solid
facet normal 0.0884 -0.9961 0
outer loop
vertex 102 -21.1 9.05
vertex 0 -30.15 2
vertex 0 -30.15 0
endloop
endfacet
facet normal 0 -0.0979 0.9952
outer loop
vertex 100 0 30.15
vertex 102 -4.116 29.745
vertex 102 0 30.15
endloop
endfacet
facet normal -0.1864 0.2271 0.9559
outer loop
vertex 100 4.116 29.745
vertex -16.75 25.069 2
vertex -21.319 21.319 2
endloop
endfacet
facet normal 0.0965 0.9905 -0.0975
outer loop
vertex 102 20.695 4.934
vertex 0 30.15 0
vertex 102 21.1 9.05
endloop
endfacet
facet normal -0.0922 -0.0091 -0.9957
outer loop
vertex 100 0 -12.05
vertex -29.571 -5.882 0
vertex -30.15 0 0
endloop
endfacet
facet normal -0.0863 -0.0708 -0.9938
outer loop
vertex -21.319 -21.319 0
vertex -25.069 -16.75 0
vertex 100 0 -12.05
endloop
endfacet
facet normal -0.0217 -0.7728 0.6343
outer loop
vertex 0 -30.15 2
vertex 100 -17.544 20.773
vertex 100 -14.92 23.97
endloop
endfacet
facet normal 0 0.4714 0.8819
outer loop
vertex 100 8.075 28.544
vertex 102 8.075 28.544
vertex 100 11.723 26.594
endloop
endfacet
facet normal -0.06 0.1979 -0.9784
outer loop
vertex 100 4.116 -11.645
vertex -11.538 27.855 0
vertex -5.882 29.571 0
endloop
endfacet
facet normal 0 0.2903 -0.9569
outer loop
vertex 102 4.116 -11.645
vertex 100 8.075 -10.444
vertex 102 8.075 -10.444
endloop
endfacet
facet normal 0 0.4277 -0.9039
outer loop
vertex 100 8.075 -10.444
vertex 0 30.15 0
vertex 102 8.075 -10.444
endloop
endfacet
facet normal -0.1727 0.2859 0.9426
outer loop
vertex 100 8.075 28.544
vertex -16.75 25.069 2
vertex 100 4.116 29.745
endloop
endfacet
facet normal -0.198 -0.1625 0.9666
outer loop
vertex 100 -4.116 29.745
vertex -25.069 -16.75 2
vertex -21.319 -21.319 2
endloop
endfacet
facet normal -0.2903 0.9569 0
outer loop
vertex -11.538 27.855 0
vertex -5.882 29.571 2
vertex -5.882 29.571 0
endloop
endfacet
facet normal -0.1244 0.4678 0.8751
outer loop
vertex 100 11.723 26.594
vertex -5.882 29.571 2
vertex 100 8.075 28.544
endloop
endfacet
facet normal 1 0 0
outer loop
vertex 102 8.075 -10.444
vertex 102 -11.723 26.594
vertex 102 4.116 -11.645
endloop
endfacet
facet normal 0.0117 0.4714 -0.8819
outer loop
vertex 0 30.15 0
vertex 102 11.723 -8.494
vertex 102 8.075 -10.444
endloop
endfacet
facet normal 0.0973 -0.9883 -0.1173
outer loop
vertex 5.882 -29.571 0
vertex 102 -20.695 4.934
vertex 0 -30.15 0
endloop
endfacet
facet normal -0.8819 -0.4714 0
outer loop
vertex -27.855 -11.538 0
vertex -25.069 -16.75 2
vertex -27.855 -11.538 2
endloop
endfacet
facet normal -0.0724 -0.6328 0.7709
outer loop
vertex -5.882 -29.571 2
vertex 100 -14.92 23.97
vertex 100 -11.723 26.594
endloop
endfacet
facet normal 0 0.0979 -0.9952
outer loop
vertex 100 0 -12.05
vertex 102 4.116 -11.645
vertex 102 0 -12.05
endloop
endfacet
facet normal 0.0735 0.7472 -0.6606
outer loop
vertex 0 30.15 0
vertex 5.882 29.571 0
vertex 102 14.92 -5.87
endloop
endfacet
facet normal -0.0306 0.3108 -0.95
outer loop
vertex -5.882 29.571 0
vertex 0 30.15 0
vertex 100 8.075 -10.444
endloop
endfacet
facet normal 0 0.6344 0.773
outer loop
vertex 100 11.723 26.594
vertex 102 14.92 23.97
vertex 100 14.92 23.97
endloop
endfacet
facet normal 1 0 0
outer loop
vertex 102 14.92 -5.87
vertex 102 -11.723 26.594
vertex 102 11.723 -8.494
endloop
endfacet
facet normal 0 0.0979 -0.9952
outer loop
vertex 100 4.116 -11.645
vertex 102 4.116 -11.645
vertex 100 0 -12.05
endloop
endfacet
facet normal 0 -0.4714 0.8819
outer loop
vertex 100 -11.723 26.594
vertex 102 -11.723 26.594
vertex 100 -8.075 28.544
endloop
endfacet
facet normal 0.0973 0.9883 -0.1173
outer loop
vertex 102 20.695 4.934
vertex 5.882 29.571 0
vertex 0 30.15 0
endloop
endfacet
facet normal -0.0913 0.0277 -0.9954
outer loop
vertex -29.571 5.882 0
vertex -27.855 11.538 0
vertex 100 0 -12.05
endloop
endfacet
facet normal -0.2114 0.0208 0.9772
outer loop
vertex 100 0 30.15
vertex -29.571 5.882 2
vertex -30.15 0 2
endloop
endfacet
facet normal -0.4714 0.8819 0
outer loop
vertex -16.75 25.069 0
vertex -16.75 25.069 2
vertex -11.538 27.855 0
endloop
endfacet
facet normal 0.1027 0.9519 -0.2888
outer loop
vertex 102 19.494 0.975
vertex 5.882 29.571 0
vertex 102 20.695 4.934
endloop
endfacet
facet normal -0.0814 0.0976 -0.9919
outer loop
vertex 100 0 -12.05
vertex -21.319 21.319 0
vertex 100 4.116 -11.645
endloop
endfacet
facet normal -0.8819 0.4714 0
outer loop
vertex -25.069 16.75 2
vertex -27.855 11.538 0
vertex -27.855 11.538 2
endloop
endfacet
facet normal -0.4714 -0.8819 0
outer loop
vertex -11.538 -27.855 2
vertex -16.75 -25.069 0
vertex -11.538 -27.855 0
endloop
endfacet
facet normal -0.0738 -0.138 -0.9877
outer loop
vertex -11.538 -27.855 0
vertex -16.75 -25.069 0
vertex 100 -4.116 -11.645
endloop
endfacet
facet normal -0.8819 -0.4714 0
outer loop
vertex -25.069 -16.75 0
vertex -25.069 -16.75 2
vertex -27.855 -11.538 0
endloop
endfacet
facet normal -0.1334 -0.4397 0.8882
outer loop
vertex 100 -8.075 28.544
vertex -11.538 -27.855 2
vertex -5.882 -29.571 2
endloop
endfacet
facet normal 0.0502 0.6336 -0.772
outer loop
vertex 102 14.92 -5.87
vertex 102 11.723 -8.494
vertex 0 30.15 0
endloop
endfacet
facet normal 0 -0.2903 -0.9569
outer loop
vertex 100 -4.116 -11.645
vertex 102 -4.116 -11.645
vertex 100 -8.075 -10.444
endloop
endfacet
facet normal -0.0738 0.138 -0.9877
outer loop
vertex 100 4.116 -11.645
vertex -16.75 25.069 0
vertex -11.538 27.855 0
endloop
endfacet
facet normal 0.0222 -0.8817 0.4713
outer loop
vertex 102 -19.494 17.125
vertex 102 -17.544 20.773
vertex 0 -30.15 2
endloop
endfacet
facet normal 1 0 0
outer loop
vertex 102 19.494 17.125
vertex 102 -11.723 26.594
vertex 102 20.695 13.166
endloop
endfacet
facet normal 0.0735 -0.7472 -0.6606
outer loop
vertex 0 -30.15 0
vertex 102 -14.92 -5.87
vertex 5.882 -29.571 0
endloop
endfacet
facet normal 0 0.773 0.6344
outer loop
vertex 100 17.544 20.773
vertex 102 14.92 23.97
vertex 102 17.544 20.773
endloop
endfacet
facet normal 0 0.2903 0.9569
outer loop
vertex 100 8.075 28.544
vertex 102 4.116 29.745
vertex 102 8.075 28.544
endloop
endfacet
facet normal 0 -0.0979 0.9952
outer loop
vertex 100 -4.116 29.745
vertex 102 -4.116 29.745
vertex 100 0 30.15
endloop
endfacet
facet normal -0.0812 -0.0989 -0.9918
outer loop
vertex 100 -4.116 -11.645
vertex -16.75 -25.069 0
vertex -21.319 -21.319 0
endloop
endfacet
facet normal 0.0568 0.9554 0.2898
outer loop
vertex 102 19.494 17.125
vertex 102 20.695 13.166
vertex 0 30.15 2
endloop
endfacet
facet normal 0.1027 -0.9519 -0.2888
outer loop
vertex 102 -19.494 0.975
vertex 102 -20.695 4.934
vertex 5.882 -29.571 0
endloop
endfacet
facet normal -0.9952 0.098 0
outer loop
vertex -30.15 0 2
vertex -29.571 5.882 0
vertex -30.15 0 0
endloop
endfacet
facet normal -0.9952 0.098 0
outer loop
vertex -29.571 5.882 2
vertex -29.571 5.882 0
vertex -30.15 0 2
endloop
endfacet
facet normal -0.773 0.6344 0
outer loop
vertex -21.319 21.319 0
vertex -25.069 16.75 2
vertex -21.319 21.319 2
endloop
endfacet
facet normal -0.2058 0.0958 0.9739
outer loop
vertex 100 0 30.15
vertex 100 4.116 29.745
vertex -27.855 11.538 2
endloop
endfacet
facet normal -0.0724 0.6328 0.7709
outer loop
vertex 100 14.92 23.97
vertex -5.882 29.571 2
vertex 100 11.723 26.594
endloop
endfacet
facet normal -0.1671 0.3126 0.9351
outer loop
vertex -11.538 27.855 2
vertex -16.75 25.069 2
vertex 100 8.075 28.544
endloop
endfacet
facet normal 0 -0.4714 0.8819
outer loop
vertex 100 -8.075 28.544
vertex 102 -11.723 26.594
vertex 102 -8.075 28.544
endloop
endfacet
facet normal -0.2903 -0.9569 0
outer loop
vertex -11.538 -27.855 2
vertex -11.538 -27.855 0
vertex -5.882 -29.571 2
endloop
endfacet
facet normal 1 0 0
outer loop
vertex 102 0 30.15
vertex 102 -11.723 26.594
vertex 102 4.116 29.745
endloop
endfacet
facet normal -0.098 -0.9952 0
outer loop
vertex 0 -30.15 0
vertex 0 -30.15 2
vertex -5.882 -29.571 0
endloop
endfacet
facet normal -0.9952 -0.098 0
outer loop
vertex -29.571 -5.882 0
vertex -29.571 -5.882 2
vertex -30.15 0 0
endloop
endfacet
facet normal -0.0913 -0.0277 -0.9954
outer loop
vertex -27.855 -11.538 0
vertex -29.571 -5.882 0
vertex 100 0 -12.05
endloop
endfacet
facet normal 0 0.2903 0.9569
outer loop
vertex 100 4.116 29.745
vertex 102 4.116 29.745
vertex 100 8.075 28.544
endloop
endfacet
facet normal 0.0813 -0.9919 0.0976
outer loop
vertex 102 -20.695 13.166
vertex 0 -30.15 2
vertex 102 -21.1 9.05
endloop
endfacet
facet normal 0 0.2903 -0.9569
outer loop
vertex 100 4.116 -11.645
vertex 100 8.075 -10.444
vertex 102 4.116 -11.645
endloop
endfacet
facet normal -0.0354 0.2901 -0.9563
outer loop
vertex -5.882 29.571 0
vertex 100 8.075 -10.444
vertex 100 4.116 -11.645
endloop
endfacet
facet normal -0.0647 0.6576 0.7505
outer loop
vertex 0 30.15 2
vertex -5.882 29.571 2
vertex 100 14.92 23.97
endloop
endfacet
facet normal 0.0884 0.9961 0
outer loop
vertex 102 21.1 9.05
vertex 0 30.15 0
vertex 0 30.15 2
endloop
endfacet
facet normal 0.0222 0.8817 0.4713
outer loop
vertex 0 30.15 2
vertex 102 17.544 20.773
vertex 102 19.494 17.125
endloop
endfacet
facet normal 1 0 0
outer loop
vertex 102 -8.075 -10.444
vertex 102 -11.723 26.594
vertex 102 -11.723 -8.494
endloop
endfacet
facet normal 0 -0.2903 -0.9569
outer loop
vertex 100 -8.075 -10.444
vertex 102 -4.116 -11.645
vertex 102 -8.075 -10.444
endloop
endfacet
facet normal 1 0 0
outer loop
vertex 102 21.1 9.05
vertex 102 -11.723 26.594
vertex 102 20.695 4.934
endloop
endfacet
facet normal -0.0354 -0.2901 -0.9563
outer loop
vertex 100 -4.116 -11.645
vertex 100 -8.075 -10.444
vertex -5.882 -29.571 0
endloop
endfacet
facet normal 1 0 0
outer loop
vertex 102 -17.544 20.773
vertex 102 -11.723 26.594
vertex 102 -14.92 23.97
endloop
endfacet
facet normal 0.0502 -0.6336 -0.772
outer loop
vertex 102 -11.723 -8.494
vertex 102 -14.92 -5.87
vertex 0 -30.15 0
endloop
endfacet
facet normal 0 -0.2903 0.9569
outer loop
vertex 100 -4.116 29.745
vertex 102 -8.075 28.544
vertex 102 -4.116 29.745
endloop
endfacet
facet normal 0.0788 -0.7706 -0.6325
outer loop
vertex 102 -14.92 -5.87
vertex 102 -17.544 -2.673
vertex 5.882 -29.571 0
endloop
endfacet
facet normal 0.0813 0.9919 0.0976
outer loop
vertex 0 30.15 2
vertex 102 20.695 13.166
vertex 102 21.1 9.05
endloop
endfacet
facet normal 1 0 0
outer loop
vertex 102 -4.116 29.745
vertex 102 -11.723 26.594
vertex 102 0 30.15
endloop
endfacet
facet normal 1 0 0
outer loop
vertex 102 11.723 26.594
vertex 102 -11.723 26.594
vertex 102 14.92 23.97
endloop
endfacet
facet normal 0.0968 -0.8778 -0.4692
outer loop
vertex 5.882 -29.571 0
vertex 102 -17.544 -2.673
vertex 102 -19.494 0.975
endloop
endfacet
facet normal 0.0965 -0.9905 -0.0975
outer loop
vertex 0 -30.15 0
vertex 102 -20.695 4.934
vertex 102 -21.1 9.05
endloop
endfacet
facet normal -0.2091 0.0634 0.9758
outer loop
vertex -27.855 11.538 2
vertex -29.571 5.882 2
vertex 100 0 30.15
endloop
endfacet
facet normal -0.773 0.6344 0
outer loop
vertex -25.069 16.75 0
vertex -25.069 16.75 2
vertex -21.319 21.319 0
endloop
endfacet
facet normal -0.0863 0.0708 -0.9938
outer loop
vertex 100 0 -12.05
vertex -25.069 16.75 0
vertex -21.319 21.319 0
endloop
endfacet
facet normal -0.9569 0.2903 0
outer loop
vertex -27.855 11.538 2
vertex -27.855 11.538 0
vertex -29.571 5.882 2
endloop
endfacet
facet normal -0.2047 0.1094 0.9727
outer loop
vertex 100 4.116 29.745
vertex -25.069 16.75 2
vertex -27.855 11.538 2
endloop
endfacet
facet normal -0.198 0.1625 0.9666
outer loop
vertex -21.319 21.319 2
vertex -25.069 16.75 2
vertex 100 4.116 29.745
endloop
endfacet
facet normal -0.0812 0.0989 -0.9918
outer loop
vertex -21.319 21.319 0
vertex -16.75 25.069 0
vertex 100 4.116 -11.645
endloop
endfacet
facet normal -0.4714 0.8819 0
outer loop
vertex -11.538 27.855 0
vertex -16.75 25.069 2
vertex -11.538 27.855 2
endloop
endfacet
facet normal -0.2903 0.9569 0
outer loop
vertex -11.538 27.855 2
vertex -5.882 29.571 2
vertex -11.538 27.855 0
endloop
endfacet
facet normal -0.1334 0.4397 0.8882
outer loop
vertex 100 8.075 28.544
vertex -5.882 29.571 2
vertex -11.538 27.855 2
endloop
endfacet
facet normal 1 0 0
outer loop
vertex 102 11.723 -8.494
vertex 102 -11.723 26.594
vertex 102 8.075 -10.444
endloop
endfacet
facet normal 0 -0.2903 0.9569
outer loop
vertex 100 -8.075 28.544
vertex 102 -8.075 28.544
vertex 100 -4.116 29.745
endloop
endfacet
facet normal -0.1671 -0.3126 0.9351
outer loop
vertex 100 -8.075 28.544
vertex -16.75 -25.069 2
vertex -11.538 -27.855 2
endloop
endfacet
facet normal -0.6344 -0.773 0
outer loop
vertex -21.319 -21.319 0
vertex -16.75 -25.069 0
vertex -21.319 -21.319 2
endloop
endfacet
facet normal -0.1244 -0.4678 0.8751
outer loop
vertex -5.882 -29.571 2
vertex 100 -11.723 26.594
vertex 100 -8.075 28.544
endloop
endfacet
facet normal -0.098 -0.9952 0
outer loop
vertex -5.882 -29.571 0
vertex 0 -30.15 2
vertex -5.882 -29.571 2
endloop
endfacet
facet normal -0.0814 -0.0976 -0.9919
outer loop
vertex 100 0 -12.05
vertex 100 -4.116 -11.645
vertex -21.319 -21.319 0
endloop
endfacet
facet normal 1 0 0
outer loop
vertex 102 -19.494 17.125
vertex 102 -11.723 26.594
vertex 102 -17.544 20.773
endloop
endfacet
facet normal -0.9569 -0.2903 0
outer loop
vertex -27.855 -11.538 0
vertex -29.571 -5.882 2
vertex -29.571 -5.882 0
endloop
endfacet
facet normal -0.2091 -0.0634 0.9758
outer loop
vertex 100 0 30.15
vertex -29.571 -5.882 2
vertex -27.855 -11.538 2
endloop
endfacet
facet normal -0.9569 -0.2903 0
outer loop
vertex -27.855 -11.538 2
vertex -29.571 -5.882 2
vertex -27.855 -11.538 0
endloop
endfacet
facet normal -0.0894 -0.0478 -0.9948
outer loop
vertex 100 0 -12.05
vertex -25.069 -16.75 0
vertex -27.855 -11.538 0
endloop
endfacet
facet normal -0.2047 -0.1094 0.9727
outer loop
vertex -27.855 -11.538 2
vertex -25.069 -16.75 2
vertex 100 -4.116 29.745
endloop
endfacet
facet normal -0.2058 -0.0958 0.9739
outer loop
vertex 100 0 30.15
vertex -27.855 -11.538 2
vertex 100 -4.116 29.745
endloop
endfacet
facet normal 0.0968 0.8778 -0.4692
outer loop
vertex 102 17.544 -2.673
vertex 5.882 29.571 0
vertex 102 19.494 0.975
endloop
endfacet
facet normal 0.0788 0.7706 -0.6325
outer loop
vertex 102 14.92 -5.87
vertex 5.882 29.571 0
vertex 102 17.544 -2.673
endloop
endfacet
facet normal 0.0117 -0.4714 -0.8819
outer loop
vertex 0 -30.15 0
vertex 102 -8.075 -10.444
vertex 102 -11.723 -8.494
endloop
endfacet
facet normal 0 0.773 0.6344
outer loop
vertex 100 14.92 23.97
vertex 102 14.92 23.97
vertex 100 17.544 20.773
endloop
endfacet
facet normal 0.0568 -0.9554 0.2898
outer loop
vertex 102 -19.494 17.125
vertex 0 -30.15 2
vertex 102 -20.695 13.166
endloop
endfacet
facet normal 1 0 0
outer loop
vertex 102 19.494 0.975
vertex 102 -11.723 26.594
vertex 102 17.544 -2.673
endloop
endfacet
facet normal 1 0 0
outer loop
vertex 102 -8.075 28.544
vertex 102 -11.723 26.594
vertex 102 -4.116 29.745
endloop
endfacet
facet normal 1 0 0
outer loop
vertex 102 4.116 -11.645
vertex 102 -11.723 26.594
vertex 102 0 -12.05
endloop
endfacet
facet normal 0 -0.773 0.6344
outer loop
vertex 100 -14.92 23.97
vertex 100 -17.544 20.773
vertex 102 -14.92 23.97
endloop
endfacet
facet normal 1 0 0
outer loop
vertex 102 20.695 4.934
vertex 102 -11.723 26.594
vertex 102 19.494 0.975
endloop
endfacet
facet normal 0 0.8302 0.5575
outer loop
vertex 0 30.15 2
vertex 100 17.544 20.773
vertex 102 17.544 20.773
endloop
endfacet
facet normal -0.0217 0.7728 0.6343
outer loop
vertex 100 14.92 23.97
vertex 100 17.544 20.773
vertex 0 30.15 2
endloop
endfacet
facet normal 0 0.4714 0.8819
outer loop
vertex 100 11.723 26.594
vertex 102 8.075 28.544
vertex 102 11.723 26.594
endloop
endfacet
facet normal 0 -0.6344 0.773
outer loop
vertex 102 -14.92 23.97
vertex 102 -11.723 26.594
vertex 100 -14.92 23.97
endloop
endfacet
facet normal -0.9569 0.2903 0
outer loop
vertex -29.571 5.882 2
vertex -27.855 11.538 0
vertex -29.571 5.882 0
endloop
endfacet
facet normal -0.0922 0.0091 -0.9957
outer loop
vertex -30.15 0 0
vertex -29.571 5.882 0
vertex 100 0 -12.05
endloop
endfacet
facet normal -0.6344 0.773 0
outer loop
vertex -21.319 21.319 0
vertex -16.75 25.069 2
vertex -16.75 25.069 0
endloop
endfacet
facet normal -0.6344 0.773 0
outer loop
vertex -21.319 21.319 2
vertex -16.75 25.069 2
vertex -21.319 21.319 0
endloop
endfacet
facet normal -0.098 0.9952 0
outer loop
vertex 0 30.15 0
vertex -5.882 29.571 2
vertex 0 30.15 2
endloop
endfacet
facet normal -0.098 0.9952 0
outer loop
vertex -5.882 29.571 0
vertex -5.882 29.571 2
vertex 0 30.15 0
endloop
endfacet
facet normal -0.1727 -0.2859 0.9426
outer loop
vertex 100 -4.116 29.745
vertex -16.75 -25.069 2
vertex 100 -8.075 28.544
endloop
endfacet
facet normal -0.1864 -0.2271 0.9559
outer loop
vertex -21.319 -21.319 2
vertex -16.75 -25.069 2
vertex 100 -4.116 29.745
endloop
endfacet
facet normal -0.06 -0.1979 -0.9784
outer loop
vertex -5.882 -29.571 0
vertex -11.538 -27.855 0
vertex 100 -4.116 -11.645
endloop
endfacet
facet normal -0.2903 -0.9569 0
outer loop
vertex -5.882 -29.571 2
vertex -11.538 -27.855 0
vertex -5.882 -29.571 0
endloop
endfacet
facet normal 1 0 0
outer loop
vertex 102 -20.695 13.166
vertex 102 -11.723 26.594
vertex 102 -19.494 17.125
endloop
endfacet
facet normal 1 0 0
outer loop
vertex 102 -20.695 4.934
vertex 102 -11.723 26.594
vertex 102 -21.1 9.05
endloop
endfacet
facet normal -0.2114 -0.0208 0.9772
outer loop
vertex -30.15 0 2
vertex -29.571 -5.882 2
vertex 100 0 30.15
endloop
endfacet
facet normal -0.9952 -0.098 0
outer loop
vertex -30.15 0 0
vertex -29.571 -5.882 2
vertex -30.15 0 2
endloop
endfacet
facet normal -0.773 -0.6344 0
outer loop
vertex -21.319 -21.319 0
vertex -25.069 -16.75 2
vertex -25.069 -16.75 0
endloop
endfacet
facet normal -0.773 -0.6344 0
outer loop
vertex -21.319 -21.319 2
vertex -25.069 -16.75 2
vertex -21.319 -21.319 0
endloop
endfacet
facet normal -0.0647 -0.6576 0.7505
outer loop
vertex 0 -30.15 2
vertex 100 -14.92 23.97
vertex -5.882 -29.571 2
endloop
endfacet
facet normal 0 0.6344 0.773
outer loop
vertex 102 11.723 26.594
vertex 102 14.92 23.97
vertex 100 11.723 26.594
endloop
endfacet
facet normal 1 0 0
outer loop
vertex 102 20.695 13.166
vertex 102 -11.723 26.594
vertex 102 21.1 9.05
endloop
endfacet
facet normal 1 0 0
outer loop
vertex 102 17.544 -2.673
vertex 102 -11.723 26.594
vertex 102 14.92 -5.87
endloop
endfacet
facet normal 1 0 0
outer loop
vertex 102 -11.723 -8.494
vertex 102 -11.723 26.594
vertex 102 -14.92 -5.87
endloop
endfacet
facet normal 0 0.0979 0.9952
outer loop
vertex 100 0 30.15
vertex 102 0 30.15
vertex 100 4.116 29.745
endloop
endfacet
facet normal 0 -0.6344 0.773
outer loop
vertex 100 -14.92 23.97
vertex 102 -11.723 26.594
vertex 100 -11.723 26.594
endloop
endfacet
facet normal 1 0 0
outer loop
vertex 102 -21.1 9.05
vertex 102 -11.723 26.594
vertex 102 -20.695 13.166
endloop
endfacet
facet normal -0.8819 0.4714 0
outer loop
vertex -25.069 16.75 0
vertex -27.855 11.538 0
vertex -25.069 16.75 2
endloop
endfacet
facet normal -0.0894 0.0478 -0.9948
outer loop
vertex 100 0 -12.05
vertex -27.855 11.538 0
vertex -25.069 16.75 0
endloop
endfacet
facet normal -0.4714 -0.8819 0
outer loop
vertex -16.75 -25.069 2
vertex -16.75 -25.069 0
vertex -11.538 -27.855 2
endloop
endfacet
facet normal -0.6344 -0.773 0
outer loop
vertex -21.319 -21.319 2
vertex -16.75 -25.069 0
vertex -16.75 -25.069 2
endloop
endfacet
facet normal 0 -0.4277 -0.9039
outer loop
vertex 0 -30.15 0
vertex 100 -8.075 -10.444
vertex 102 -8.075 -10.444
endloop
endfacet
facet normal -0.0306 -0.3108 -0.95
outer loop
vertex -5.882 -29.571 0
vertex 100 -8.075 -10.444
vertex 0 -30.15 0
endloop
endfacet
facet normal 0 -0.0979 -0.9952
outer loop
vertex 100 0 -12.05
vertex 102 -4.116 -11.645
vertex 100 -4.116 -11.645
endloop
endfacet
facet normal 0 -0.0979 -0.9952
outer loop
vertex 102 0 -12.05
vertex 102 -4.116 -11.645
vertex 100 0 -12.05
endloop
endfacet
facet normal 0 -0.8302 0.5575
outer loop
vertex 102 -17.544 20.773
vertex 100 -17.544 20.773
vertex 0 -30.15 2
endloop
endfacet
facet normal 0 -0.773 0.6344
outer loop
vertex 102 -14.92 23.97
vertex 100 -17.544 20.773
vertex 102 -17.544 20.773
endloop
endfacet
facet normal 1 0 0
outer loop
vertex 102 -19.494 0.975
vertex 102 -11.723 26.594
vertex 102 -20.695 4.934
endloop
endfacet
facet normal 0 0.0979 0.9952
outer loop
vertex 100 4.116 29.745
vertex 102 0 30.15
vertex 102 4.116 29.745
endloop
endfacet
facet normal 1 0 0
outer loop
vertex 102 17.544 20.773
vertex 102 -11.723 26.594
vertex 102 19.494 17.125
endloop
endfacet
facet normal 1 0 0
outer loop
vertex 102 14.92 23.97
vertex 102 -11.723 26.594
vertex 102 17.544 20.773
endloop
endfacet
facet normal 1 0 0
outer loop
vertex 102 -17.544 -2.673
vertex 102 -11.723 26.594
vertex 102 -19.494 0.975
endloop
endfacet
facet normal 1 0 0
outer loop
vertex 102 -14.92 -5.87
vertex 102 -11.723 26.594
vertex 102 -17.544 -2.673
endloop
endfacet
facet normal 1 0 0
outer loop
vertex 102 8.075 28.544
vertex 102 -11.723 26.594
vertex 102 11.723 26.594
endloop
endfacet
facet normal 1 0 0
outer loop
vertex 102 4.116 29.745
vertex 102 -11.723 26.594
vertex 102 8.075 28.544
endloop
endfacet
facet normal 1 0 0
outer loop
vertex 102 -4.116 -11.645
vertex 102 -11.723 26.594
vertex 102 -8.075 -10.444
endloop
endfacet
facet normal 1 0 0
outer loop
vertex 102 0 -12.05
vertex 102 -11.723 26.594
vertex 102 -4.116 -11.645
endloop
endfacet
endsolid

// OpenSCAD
// Eccentric reducer — centerlines offset so the BOTTOM of the pipe
// stays flat (drains completely).
//
// @part reducer_eccentric
// @kind fitting
// @category fitting.reducer.eccentric
// @display-name "Eccentric Reducer (2\"x1.25\")"
// @mfg victaulic
// @mfg-pn Style-50E
// @price-usd 12.00
// @install-minutes 6
// @crew journeyman
// @param large_size_in enum[1.5,2,2.5,3,4] default=2 label="Large Size" unit="in"
// @param small_size_in enum[1,1.25,1.5,2,2.5] default=1.25 label="Small Size" unit="in"
// @port run_in  position=[0,0,0]    direction=[-1,0,0] style=grooved size_in=2    role=run_a
// @port run_out position=[0.1,0,0]  direction=[1,0,0]  style=grooved size_in=1.25 role=run_b

big_od = 60.3;   // 2"
small_od = 42.2; // 1-1/4"
length = 100;
offset_y = (big_od - small_od) / 2;
hull() {
    translate([0, 0, 0])
        cylinder(h = 2, d = big_od, $fn = 32);
    translate([length, 0, offset_y])
        rotate([0, 90, 0])
            cylinder(h = 2, d = small_od, $fn = 32);
}
